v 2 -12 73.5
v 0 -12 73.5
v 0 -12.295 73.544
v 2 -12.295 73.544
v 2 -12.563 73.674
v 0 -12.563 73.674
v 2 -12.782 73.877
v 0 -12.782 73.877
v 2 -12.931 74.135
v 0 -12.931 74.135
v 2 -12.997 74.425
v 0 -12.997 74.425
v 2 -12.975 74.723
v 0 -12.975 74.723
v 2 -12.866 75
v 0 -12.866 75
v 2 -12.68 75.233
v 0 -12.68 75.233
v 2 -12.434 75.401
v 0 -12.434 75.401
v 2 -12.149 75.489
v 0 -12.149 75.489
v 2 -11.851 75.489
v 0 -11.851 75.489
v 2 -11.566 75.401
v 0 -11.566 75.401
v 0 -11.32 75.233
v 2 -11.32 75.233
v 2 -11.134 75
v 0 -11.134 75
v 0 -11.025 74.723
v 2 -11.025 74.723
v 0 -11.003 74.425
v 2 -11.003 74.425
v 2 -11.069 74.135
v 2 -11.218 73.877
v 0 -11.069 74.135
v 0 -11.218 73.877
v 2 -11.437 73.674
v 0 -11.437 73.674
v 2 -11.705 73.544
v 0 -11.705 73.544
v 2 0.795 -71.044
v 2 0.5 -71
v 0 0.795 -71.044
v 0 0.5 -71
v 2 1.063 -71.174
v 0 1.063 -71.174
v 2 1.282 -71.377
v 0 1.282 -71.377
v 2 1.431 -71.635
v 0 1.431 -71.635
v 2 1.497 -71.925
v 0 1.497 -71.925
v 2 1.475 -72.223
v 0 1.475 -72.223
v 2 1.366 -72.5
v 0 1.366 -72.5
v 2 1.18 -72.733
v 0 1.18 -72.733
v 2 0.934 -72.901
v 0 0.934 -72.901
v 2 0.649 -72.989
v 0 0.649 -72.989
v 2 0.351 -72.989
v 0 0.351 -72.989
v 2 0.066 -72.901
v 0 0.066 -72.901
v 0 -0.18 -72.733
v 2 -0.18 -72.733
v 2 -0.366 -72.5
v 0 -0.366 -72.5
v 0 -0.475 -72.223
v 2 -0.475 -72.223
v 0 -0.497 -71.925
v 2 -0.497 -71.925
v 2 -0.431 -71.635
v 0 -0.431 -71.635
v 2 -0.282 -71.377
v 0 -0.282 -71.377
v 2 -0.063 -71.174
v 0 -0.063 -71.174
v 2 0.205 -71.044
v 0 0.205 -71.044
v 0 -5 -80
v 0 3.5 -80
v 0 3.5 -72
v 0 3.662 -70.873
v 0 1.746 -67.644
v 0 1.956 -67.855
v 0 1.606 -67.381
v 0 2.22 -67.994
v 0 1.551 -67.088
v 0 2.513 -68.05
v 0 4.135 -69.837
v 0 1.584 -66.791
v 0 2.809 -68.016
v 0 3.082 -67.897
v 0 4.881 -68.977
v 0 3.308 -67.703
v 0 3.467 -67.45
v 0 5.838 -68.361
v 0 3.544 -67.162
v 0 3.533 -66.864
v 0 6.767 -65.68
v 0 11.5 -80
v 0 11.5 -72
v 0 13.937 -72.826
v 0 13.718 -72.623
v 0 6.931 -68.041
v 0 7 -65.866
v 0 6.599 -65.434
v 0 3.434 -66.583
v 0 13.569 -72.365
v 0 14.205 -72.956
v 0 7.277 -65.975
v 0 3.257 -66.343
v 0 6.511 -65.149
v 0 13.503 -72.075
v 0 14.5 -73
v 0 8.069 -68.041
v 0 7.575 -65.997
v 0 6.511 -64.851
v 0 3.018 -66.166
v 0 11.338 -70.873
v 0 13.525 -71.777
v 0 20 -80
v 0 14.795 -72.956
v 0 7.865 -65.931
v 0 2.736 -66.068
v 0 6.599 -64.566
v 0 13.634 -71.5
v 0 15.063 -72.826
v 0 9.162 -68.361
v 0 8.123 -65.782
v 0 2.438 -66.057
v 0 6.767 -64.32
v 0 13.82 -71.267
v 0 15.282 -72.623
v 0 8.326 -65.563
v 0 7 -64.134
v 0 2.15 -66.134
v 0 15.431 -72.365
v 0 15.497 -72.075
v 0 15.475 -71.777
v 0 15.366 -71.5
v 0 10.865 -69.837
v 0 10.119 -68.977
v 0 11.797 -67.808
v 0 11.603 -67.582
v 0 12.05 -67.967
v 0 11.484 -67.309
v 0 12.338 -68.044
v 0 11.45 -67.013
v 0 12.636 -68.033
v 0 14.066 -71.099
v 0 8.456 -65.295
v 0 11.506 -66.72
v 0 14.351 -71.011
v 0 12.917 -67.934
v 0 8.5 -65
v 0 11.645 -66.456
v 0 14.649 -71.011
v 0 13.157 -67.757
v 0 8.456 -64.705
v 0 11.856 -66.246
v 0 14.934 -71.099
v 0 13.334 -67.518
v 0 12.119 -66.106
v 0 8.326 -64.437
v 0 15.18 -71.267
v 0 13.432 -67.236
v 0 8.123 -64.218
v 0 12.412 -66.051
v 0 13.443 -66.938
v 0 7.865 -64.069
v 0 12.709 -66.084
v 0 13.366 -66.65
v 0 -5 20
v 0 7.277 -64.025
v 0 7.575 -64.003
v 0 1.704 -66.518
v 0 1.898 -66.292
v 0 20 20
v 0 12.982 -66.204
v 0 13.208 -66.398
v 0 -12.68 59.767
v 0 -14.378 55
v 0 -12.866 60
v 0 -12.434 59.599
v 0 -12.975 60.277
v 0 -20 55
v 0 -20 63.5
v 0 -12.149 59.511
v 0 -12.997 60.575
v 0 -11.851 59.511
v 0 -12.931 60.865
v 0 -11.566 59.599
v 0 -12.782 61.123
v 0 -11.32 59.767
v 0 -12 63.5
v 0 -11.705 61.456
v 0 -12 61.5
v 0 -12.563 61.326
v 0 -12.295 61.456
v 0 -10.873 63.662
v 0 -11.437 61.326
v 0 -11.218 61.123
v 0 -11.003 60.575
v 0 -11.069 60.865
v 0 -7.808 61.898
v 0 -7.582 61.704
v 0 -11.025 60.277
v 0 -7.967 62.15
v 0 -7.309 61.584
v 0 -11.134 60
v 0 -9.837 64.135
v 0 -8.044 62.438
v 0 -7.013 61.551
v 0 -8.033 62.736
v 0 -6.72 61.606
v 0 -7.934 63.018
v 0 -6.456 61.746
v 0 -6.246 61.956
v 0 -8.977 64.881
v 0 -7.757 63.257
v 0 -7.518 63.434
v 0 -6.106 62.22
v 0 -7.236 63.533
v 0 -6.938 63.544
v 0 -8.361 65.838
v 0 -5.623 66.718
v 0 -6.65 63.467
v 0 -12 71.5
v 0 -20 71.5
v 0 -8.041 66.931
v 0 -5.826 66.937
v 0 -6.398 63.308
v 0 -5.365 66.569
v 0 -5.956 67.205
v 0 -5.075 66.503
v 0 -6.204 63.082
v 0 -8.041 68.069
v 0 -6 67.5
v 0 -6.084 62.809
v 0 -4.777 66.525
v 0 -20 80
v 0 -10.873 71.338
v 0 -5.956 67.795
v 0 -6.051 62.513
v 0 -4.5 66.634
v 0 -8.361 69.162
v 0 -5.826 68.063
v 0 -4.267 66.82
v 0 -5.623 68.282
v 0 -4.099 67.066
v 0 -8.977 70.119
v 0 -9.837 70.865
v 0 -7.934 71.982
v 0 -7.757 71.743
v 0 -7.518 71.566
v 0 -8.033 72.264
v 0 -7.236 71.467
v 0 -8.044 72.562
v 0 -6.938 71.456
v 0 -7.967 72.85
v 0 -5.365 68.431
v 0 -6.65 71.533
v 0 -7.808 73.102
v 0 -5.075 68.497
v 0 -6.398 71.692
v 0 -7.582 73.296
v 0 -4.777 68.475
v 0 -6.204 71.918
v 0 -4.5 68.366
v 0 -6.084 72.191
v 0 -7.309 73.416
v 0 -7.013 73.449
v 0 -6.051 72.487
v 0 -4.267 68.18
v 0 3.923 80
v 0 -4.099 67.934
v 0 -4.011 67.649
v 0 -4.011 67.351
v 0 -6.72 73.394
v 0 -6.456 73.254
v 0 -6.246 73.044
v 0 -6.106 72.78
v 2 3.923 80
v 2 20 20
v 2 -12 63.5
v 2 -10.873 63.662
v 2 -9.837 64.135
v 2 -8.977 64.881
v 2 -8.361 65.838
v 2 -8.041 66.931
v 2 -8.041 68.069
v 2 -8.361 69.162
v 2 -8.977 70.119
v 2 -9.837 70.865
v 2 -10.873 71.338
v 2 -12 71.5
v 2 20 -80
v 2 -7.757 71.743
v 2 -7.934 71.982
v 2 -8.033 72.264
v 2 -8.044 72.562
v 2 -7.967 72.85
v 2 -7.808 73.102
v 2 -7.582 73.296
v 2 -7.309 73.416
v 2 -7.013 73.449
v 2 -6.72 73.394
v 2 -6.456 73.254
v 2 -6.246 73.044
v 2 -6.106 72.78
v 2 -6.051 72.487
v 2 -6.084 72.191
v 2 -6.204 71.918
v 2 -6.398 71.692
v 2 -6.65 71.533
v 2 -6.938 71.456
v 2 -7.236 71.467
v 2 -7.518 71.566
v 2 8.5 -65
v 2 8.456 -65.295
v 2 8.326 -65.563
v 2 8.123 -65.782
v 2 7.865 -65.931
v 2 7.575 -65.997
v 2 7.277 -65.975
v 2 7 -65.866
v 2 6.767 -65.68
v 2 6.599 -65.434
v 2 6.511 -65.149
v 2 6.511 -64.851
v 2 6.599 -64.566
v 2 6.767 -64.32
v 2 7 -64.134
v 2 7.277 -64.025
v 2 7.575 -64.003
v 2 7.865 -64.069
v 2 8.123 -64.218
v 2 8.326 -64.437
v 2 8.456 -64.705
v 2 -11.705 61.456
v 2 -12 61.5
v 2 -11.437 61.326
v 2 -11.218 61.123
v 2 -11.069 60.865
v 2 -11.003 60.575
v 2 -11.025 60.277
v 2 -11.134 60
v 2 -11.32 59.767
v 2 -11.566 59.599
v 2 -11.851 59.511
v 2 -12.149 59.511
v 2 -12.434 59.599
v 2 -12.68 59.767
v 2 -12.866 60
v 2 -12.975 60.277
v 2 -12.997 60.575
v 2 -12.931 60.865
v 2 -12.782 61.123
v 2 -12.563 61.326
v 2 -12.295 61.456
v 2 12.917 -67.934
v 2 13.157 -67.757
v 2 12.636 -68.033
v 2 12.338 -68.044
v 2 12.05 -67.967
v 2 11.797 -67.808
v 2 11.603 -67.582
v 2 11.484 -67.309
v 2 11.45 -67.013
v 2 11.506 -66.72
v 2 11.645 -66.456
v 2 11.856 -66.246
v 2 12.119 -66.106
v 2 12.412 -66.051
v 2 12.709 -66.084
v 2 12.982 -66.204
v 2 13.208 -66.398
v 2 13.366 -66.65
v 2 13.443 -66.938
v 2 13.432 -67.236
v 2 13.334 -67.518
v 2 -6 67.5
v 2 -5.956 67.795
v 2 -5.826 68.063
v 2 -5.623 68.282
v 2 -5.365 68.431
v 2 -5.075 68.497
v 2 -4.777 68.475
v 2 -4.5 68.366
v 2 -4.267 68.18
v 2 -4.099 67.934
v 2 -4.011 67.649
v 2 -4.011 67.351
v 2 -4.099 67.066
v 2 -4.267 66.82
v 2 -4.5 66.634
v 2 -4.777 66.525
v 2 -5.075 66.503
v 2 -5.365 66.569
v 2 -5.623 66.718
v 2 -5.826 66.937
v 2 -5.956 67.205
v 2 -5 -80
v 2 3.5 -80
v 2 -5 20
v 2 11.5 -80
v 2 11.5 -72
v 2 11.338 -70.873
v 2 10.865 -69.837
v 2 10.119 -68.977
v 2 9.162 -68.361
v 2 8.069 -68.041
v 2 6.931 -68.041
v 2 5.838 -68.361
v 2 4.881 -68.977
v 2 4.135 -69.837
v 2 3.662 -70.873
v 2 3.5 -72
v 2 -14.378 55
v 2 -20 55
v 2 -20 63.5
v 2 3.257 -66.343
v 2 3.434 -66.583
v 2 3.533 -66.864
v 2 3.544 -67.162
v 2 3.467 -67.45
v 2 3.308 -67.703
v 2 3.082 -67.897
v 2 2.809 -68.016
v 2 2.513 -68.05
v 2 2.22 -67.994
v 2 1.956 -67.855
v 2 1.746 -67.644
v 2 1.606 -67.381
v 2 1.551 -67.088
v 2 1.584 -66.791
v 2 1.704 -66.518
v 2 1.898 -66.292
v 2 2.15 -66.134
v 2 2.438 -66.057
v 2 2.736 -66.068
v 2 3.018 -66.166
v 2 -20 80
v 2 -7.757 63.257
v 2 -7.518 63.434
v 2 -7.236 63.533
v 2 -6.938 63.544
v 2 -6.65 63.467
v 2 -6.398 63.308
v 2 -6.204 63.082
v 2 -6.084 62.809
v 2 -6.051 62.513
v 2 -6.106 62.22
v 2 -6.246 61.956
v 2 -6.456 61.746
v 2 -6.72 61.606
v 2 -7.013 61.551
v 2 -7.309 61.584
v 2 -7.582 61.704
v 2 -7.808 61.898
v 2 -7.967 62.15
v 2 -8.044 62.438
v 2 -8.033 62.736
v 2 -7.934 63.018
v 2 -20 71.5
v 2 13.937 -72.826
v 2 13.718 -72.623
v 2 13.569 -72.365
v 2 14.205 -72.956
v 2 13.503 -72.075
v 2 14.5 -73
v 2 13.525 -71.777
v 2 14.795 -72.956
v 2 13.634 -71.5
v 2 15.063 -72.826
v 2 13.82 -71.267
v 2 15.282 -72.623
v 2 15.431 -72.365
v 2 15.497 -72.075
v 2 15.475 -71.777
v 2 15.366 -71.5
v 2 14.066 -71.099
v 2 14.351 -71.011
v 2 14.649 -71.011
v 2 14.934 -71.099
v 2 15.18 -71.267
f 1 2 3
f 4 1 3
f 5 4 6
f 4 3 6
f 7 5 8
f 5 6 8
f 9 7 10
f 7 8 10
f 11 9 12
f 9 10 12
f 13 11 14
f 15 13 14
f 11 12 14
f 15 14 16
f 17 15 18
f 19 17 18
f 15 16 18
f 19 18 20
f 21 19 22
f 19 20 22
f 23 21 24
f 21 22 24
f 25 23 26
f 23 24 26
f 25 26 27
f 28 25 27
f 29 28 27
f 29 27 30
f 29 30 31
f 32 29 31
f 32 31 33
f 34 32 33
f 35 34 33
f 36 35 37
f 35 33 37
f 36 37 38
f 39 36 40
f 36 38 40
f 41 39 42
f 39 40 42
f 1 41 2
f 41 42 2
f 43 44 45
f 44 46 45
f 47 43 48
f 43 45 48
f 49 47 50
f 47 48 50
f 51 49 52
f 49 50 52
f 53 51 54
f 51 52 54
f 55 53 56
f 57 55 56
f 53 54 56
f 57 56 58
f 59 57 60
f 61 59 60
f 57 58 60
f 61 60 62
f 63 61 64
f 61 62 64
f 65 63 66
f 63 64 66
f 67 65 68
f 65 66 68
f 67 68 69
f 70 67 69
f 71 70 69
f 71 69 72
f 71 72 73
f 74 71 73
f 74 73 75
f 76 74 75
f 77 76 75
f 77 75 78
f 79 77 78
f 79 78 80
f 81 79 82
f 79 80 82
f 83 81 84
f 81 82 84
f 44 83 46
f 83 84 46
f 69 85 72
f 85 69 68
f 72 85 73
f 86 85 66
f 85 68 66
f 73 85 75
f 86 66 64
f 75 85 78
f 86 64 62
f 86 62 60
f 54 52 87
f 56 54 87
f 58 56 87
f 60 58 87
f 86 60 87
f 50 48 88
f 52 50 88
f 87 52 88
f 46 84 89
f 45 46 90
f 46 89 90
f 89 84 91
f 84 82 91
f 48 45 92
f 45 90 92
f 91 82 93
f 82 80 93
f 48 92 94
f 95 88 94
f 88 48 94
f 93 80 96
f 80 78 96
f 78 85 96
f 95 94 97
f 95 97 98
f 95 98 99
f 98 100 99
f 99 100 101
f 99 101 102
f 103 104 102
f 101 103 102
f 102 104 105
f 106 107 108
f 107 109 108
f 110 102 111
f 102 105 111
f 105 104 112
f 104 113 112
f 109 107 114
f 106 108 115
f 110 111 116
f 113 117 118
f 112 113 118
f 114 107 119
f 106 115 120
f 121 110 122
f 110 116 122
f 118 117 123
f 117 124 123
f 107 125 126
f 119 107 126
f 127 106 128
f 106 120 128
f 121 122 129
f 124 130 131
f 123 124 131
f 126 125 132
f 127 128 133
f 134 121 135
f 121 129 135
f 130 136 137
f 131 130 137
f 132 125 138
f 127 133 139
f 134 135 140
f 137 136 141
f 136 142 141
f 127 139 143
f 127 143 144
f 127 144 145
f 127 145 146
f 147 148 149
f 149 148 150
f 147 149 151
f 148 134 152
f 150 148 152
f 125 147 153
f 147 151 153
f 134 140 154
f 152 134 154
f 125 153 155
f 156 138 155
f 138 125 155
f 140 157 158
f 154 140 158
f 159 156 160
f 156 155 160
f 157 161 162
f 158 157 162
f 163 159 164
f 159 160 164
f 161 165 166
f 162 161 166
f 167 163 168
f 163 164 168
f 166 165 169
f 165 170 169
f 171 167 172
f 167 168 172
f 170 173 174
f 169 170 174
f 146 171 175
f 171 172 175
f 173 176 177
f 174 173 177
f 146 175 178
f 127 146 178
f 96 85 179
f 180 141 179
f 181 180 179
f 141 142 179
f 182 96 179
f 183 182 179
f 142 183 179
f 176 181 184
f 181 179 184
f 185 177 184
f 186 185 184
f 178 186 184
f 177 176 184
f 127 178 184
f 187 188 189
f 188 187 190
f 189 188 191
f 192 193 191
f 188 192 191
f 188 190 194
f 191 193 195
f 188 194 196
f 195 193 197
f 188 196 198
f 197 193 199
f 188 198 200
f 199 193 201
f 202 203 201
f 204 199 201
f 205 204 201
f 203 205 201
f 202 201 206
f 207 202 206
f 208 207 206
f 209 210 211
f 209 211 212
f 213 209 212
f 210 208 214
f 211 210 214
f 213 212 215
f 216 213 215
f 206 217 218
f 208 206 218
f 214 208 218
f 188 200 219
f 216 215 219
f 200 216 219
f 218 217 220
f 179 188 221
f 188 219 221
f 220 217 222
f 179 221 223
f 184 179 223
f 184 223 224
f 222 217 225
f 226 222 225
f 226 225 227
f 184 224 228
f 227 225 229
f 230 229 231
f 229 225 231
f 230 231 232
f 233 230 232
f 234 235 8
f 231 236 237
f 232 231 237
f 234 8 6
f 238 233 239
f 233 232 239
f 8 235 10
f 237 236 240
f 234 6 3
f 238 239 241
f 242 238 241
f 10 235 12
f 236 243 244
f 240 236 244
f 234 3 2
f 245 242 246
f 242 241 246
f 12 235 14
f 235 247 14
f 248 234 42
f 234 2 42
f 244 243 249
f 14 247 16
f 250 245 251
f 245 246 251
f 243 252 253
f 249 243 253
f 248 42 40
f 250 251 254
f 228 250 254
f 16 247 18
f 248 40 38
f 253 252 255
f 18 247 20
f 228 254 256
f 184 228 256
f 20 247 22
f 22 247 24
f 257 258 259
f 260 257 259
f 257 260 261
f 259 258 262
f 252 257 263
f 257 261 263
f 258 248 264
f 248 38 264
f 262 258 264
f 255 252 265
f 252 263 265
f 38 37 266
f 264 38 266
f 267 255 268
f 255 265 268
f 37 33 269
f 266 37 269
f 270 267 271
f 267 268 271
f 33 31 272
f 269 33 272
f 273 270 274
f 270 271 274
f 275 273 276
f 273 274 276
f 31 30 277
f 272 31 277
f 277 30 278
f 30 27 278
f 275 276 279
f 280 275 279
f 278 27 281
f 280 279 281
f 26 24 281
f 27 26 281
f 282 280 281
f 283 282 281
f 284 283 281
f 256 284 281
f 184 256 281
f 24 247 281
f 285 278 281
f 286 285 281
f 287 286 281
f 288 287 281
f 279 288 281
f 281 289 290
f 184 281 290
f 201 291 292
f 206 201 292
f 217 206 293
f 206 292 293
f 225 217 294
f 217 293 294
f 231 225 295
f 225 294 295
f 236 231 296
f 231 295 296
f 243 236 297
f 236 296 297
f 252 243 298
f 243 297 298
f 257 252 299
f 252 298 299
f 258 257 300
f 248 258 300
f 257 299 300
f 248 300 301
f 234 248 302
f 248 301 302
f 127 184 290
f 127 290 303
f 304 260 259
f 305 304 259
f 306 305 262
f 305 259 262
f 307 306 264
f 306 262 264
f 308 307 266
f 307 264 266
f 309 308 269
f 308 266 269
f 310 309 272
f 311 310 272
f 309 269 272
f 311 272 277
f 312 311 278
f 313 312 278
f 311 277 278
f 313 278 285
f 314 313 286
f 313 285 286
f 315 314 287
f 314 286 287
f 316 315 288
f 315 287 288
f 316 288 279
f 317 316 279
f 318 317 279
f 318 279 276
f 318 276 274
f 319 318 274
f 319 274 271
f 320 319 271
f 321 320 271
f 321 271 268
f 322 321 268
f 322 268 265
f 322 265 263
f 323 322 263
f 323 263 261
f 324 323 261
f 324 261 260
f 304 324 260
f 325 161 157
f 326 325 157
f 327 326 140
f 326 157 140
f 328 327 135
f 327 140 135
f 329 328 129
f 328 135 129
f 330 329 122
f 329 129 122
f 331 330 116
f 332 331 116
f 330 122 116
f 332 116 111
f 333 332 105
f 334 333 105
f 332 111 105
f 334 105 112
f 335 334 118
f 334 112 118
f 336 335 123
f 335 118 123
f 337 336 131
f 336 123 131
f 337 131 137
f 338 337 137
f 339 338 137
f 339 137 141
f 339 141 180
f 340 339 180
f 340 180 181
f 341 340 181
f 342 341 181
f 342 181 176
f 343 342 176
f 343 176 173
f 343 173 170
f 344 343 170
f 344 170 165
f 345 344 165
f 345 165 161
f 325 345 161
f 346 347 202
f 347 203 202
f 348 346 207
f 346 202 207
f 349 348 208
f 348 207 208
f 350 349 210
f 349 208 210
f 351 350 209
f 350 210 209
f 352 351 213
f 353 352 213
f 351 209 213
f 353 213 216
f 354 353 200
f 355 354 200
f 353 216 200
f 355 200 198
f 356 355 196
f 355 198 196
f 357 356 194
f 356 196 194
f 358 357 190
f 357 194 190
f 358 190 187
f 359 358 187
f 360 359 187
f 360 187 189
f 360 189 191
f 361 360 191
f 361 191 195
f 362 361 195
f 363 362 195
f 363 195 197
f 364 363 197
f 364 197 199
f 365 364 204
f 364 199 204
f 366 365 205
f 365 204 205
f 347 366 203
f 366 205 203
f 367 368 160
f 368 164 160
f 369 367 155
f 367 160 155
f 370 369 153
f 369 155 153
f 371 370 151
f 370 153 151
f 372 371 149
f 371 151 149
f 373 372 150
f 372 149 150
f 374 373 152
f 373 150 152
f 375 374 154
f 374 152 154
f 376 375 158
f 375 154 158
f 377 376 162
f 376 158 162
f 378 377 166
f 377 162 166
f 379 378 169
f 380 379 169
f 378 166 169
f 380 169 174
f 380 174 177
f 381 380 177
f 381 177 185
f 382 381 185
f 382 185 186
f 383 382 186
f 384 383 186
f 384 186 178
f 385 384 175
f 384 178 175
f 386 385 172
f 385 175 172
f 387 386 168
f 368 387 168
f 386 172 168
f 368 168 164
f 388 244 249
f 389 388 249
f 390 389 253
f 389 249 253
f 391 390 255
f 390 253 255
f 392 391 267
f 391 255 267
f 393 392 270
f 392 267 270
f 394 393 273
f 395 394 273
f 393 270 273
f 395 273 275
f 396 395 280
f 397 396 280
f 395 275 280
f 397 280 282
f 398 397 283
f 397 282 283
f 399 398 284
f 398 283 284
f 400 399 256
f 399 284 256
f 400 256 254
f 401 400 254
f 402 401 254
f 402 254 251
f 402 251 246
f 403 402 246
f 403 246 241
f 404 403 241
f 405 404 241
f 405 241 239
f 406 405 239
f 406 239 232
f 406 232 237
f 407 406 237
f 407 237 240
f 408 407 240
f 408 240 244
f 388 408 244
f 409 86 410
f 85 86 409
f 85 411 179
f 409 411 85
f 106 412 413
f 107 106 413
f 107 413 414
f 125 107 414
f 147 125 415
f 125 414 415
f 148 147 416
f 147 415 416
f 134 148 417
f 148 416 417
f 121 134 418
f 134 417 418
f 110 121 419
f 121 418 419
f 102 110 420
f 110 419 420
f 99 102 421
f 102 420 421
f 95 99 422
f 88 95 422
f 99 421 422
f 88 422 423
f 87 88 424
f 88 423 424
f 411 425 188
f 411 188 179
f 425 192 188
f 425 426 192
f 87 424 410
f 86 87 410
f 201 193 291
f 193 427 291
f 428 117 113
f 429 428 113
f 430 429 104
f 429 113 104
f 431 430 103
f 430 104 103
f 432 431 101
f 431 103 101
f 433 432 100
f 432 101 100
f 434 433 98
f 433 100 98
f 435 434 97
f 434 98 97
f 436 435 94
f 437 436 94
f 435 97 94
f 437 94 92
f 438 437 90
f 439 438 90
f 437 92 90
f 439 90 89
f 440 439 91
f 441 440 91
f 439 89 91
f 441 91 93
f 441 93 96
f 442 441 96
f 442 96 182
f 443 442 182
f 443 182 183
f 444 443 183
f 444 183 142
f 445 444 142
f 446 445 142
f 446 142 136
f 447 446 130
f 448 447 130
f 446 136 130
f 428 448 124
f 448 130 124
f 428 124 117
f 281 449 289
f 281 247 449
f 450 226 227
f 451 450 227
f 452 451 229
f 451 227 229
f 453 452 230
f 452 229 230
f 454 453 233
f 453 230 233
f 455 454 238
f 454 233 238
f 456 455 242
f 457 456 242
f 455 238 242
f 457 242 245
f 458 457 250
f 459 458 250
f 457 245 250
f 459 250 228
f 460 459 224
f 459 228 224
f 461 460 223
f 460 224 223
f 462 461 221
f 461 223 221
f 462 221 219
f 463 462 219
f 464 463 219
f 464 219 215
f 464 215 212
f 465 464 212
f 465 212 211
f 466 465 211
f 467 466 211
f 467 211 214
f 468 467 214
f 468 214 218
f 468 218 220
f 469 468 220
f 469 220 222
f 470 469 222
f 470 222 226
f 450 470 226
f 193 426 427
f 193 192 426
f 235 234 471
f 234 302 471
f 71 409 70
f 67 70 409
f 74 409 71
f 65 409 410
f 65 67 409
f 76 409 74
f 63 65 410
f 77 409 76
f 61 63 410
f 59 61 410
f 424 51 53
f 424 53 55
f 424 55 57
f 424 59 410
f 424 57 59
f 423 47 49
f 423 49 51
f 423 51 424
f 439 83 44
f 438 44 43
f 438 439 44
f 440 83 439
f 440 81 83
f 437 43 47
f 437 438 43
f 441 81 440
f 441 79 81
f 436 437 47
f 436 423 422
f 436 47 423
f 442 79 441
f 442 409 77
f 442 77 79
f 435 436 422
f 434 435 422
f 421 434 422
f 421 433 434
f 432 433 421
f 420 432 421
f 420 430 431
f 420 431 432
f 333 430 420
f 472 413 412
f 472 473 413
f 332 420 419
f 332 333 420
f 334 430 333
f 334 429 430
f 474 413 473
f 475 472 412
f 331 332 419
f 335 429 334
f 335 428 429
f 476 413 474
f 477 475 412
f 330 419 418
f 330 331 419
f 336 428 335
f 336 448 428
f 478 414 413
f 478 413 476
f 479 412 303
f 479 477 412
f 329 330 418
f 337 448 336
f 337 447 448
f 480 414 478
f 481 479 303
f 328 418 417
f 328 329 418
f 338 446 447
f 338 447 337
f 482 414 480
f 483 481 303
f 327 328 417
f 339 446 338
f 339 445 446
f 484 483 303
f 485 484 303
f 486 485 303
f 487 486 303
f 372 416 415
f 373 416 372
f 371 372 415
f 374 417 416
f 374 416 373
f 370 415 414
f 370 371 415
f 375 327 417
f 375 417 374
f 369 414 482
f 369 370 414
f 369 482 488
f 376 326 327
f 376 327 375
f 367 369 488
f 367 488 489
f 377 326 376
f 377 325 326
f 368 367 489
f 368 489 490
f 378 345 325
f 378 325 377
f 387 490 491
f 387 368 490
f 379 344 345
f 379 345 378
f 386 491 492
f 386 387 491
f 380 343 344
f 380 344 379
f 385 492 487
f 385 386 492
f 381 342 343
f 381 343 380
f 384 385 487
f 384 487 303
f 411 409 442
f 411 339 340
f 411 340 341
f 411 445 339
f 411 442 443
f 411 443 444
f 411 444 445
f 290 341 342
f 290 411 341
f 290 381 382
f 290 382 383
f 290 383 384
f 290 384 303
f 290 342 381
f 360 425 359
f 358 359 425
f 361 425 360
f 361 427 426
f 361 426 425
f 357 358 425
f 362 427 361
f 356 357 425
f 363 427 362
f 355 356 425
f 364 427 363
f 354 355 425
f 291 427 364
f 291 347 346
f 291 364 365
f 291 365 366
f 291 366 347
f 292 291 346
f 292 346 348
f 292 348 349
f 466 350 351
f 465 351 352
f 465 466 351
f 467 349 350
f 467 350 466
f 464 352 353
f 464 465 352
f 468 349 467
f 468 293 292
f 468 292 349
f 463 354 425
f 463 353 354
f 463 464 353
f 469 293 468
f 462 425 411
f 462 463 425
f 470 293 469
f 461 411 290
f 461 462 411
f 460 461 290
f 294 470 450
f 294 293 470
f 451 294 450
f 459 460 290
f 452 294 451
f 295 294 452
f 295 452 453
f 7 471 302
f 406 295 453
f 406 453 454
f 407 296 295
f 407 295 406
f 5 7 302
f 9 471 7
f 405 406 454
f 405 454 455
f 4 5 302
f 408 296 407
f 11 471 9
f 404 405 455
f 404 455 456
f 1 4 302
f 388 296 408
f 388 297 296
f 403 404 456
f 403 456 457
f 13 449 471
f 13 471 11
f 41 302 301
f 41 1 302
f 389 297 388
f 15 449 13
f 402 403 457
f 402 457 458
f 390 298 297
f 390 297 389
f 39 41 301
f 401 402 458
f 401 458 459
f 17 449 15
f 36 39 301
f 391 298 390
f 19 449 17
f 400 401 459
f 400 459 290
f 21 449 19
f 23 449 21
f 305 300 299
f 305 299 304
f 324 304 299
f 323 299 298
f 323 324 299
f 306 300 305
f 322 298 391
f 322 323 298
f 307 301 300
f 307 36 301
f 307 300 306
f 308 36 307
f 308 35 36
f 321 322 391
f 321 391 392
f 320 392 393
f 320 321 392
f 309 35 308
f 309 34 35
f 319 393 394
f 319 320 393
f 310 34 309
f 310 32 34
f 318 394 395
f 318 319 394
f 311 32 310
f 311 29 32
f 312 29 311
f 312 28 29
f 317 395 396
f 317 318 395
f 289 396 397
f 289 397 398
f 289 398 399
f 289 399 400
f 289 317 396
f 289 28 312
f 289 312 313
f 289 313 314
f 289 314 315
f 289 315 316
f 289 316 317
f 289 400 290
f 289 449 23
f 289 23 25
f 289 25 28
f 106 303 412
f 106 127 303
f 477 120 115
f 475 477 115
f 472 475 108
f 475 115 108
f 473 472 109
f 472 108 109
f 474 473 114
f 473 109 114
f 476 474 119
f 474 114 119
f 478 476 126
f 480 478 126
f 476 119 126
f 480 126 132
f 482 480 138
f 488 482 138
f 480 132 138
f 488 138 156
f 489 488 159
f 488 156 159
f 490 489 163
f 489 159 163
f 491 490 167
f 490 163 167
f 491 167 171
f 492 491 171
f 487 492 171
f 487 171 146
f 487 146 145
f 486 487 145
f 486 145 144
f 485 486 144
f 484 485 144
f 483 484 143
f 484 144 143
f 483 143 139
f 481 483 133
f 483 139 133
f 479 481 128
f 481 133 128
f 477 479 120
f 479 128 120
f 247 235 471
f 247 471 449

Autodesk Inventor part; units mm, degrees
ref_plane "YZ Plane" through (0, 0, 0) normal (1, 0, 0) x (0, 1, 0)
ref_plane "XZ Plane" through (0, 0, 0) normal (0, 1, 0) x (-1, 0, 0)
ref_plane "XY Plane" through (0, 0, 0) normal (0, 0, 1) x (1, 0, 0)
sketch "スケッチ1" plane through (0, 0, 0) normal (1, 0, 0) x (0, 1, 0)
  line L0 (-20, 80) -> (20, 80)
  line L1 (20, 80) -> (20, -80)
  line L2 (20, -80) -> (-20, -80)
  line L3 (-20, -80) -> (-20, 80)
  point P0 (0, 0)
  dimension "d0" = 40
  dimension "d2" = 160
  dimension "d3" = 80
  dimension "d4" = 20
extrude "押し出し1" add sketch "スケッチ1" along normal blind 2
sketch "スケッチ2" plane through (2, 0, 0) normal (1, 0, 0) x (0, 0, -1)
  line L0 (-80, 20) -> (-80, -20) projected
  line L1 (-80, -20) -> (80, -20) projected
  line L2 (80, -20) -> (80, 20) projected
  line L3 (80, 20) -> (-80, 20) projected
  line L4 (-80, 3.923) -> (-20, 20)
  line L5 (-55, -20) -> (-55, -14.3782)
  line L6 (-55, -14.3782) -> (-20, -5)
  line L7 (-20, -5) -> (80, -5)
  point P0 (0, 0)
  dimension "d7" = 25
  dimension "d8" = 165
  dimension "d9" = 15
  dimension "d10" = 100
  dimension "d11" = 100
  dimension "d12" = 25
extrude "押し出し2" cut sketch "スケッチ2" against normal blind 2 contours L4 L3 L2 L7 L6 L5 L1 L0 keep common part
sketch "スケッチ3" plane through (2, 0, 0) normal (1, 0, 0) x (0, 0, -1)
  line L0 (80, -5) -> (-20, -5) projected
  line L1 (80, -5) -> (80, 20) projected
  line L2 (80, 20) -> (-20, 20) projected
  line L3 (-80, 3.923) -> (-20, 20) projected
  line L4 (-80, 3.923) -> (-80, -20) projected
  line L5 (-80, -20) -> (-55, -20) projected
  line L6 (-55, -14.3782) -> (-55, -20) projected
  line L7 (-20, -5) -> (-55, -14.3782) projected
  line L8 (-71.5, -20) -> (-63.5, -20)
  line L9 (-63.5, -20) -> (-63.5, -12)
  line L10 (-71.5, -12) -> (-71.5, -20)
  line L11 (80, 11.5) -> (72, 11.5)
  line L12 (72, 3.5) -> (80, 3.5)
  line L13 (80, 3.5) -> (80, 11.5)
  arc A0 (-63.5, -12) -> (-71.5, -12) centre (-67.5, -12) ccw
  arc A1 (72, 11.5) -> (72, 3.5) centre (72, 7.5) ccw
  point P0 (0, 0)
  dimension "d18" = 8
  dimension "d19" = 12.5
  dimension "d20" = 8
  dimension "d21" = 12.5
  dimension "d23" = 8
  dimension "d24" = 4
  dimension "d25" = 8
  dimension "d26" = 8
  dimension "d27" = 8
extrude "押し出し3" cut sketch "スケッチ3" against normal blind 2 contours L0 L7 L6 L5 L9 A0 L10 L4 L3 L2 L1 L11 A1 L12 keep common part
sketch "スケッチ4" plane through (2, 0, 0) normal (1, 0, 0) x (0, 0, -1)
  arc A0 (72, 11.5) -> (72, 3.5) centre (72, 7.5) ccw projected
  line L0 (80, 11.5) -> (80, 20) projected
  line L1 (-80, -20) -> (-71.5, -20) projected
  arc A1 (-63.5, -12) -> (-71.5, -12) centre (-67.5, -12) ccw projected
  circle A2 centre (-74.5, -12) radius 1
  circle A3 centre (72, 14.5) radius 1
  point P0 (0, 0)
  dimension "d30" = 8
  dimension "d31" = 7
  dimension "d32" = 2
  dimension "d33" = 8
  dimension "d34" = 7
hole "穴1" at (2, -12, 74.5) at (2, 14.5, -72) direction (-1, 0, 0) diameter 2 end through all
pattern_circular "円形状パターン1" count 5 over 180 about axis through (2, -12, 67.5) along (-1, 0, 0) of "穴1"
pattern_circular "円形状パターン2" count 5 over 180 about axis through (2, 7.5, -72) along (1, 0, 0) of "穴1"
properties part number "Flame"
